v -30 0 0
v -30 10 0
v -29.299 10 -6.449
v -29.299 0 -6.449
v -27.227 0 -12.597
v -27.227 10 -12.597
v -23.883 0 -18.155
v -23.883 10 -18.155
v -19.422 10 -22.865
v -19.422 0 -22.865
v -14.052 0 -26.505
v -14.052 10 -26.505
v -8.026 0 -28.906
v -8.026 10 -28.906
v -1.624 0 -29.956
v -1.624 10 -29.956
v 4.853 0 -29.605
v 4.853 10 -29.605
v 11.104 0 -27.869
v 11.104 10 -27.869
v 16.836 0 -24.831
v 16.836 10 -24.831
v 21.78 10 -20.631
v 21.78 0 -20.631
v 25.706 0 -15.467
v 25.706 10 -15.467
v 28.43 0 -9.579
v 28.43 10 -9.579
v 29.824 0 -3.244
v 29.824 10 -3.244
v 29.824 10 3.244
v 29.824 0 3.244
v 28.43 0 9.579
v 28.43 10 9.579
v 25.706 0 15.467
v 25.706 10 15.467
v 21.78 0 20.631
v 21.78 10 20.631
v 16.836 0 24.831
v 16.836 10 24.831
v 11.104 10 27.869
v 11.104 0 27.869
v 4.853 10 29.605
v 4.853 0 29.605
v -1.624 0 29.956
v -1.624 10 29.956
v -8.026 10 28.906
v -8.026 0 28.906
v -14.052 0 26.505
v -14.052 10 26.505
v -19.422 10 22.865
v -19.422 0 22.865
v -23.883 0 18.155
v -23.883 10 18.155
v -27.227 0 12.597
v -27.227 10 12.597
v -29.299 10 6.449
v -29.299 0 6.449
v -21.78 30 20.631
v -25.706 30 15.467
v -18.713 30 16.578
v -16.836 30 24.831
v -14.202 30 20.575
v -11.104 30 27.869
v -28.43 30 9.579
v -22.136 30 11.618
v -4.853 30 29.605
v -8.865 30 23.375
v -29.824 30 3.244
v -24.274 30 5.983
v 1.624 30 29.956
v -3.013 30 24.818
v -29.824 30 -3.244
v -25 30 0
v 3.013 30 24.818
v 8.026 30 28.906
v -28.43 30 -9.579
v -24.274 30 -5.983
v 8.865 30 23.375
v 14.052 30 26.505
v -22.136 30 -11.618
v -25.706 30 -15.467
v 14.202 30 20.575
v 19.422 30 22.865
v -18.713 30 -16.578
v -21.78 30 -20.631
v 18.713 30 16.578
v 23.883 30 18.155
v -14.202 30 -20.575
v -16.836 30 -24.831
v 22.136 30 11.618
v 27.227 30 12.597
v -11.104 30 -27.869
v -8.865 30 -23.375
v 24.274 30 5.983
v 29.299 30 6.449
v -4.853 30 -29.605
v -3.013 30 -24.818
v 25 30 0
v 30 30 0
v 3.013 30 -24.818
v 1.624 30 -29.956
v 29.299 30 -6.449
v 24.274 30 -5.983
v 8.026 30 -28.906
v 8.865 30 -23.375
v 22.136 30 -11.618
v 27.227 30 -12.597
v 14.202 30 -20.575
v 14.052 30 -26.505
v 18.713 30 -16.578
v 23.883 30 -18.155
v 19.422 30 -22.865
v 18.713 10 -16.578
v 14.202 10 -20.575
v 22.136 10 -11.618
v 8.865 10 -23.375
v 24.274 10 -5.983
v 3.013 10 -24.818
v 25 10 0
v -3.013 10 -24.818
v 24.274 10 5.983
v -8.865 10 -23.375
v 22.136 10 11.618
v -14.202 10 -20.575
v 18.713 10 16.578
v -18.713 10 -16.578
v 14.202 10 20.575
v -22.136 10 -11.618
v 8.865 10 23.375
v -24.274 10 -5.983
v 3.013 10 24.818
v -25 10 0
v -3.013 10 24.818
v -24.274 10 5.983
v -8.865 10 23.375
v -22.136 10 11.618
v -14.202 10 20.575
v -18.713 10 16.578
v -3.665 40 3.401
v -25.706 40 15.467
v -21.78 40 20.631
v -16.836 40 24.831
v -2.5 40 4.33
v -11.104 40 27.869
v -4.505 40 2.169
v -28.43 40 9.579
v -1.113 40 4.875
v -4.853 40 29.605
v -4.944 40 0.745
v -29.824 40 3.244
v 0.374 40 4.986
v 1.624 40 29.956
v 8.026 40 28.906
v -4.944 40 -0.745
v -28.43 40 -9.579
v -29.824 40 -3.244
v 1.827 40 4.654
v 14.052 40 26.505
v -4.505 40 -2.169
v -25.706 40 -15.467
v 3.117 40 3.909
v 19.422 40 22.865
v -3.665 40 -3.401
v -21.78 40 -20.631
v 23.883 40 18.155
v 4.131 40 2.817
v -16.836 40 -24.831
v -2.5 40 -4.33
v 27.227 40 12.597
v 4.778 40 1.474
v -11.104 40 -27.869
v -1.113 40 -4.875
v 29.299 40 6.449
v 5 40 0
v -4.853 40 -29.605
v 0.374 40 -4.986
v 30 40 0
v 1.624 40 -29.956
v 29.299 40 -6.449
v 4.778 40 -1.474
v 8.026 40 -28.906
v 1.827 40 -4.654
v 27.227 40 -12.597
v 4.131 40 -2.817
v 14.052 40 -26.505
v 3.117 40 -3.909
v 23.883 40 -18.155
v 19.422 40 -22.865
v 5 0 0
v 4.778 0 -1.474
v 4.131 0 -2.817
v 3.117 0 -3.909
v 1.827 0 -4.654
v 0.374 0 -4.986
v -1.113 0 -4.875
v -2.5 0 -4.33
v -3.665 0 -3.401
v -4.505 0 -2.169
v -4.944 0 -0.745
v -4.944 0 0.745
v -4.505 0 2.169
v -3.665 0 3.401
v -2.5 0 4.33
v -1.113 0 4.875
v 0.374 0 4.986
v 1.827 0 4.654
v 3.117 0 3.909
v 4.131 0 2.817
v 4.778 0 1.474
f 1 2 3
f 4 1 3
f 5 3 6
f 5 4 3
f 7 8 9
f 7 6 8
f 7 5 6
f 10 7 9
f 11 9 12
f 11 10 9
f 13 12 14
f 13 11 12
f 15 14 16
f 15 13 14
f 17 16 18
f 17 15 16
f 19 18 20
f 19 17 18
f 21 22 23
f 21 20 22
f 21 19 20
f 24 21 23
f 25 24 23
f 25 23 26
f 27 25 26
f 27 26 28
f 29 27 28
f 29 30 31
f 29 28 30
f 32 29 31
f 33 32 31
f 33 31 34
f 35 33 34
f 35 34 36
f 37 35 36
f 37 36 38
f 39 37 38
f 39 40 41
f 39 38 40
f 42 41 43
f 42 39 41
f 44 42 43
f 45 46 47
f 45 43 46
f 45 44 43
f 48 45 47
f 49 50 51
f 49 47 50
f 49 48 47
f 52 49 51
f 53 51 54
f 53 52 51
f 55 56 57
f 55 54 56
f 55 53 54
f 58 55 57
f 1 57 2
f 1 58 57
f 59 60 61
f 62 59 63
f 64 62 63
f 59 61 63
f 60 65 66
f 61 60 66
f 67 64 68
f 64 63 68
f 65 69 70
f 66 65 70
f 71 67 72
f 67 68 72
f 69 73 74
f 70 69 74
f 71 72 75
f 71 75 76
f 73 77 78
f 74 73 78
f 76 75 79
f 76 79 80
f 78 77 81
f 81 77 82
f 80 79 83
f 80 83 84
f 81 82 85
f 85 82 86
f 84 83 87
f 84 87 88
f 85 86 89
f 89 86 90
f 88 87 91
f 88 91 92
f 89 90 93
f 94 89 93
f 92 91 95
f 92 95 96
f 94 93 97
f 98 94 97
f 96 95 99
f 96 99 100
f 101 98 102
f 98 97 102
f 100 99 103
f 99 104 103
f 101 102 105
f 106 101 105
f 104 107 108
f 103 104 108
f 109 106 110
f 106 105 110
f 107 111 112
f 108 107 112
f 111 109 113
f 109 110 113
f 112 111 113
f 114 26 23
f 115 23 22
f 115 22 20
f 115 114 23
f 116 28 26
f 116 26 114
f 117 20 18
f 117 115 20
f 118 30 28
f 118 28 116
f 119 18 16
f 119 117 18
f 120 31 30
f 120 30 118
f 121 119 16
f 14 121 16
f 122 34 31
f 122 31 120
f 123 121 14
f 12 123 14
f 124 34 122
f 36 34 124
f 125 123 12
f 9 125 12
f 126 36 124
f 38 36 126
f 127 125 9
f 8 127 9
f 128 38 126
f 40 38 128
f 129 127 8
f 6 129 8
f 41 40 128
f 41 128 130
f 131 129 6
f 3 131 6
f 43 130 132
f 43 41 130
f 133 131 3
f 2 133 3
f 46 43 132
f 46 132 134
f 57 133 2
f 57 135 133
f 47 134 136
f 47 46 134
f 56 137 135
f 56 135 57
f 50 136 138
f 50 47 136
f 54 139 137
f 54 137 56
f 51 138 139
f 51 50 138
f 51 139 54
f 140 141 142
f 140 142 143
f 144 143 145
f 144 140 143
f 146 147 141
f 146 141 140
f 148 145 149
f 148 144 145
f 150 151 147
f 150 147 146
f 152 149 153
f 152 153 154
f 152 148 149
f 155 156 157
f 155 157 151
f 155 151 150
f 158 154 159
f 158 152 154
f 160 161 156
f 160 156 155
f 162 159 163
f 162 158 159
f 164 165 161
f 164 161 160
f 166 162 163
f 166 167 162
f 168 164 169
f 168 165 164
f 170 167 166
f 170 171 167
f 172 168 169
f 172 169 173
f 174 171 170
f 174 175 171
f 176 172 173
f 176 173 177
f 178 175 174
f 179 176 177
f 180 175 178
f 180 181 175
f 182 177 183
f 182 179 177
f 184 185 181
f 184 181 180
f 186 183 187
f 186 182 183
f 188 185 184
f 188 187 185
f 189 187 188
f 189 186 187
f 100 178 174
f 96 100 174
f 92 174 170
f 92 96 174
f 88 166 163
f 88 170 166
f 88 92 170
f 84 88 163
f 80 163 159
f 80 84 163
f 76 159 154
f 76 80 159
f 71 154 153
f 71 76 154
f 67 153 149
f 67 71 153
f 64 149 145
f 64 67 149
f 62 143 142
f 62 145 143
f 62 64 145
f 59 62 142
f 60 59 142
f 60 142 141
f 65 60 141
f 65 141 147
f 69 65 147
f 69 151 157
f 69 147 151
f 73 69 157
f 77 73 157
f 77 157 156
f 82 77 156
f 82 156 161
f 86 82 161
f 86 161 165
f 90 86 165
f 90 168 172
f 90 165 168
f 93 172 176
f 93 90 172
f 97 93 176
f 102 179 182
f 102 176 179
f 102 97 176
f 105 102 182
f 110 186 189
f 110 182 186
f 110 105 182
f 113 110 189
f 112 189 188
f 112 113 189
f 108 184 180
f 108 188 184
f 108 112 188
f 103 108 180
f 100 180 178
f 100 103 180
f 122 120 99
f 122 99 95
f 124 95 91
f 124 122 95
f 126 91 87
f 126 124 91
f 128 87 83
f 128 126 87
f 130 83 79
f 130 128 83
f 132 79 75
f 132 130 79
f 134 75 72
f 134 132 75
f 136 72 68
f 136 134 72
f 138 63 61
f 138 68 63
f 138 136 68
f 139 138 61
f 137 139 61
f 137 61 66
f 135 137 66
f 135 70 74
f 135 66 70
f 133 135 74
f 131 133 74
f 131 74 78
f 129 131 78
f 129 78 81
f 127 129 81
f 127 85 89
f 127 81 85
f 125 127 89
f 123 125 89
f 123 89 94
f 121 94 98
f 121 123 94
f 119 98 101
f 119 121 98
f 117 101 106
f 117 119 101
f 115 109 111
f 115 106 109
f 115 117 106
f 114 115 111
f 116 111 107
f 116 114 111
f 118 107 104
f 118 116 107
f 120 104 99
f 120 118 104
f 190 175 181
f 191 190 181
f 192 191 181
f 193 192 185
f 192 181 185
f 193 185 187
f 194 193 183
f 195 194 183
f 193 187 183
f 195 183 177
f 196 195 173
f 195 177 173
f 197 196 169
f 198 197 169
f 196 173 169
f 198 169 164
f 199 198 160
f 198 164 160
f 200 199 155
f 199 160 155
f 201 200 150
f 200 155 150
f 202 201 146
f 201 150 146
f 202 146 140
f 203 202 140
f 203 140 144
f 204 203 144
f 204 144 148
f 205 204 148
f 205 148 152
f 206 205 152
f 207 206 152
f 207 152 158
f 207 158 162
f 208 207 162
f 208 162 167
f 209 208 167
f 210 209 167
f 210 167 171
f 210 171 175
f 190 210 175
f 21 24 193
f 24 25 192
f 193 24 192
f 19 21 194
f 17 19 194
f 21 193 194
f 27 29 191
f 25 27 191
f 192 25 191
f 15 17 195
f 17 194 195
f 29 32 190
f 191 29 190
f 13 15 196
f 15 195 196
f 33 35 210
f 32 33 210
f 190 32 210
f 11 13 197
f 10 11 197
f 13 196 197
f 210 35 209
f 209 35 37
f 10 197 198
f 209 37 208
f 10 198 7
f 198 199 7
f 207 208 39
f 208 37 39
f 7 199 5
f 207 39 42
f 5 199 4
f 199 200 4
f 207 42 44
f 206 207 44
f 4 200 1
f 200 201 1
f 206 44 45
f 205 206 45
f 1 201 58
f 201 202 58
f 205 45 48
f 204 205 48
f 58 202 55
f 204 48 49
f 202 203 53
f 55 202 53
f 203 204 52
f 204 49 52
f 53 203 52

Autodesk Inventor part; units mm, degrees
ref_plane "YZ Plane" through (0, 0, 0) normal (1, 0, 0) x (0, 1, 0)
ref_plane "XZ Plane" through (0, 0, 0) normal (0, 1, 0) x (-1, 0, 0)
ref_plane "XY Plane" through (0, 0, 0) normal (0, 0, 1) x (1, 0, 0)
sketch "Sketch1" plane through (0, 0, 0) normal (0, 1, 0) x (-1, 0, 0)
  circle A0 centre (0, 0) radius 30
  dimension "d0" = 60
extrude "Extrusion1" add sketch "Sketch1" along normal blind 10
sketch "Sketch2" plane through (0, 10, 0) normal (0, 1, 0) x (1, 0, 0)
  circle A0 centre (0, 0) radius 5
  dimension "d3" = 10
extrude "Extrusion2" cut sketch "Sketch2" against normal through all
sketch "Sketch3" plane through (0, 10, 0) normal (0, 1, 0) x (1, 0, 0)
  circle A0 centre (0, 0) radius 25
  dimension "d6" = 50
extrude "Extrusion3" add sketch "Sketch3" along normal blind 20
sketch "Sketch5" plane through (0, 30, 0) normal (0, 1, 0) x (1, 0, 0)
  circle A0 centre (0, 0) radius 30
  dimension "d9" = 60
extrude "Extrusion4" add sketch "Sketch5" along normal blind 10
sketch "Sketch6" plane through (0, 40, 0) normal (0, 1, 0) x (1, 0, 0)
  circle A0 centre (0, 0) radius 5
  dimension "d12" = 10
extrude "Extrusion5" cut sketch "Sketch6" against normal through all
properties part number "pulley"
